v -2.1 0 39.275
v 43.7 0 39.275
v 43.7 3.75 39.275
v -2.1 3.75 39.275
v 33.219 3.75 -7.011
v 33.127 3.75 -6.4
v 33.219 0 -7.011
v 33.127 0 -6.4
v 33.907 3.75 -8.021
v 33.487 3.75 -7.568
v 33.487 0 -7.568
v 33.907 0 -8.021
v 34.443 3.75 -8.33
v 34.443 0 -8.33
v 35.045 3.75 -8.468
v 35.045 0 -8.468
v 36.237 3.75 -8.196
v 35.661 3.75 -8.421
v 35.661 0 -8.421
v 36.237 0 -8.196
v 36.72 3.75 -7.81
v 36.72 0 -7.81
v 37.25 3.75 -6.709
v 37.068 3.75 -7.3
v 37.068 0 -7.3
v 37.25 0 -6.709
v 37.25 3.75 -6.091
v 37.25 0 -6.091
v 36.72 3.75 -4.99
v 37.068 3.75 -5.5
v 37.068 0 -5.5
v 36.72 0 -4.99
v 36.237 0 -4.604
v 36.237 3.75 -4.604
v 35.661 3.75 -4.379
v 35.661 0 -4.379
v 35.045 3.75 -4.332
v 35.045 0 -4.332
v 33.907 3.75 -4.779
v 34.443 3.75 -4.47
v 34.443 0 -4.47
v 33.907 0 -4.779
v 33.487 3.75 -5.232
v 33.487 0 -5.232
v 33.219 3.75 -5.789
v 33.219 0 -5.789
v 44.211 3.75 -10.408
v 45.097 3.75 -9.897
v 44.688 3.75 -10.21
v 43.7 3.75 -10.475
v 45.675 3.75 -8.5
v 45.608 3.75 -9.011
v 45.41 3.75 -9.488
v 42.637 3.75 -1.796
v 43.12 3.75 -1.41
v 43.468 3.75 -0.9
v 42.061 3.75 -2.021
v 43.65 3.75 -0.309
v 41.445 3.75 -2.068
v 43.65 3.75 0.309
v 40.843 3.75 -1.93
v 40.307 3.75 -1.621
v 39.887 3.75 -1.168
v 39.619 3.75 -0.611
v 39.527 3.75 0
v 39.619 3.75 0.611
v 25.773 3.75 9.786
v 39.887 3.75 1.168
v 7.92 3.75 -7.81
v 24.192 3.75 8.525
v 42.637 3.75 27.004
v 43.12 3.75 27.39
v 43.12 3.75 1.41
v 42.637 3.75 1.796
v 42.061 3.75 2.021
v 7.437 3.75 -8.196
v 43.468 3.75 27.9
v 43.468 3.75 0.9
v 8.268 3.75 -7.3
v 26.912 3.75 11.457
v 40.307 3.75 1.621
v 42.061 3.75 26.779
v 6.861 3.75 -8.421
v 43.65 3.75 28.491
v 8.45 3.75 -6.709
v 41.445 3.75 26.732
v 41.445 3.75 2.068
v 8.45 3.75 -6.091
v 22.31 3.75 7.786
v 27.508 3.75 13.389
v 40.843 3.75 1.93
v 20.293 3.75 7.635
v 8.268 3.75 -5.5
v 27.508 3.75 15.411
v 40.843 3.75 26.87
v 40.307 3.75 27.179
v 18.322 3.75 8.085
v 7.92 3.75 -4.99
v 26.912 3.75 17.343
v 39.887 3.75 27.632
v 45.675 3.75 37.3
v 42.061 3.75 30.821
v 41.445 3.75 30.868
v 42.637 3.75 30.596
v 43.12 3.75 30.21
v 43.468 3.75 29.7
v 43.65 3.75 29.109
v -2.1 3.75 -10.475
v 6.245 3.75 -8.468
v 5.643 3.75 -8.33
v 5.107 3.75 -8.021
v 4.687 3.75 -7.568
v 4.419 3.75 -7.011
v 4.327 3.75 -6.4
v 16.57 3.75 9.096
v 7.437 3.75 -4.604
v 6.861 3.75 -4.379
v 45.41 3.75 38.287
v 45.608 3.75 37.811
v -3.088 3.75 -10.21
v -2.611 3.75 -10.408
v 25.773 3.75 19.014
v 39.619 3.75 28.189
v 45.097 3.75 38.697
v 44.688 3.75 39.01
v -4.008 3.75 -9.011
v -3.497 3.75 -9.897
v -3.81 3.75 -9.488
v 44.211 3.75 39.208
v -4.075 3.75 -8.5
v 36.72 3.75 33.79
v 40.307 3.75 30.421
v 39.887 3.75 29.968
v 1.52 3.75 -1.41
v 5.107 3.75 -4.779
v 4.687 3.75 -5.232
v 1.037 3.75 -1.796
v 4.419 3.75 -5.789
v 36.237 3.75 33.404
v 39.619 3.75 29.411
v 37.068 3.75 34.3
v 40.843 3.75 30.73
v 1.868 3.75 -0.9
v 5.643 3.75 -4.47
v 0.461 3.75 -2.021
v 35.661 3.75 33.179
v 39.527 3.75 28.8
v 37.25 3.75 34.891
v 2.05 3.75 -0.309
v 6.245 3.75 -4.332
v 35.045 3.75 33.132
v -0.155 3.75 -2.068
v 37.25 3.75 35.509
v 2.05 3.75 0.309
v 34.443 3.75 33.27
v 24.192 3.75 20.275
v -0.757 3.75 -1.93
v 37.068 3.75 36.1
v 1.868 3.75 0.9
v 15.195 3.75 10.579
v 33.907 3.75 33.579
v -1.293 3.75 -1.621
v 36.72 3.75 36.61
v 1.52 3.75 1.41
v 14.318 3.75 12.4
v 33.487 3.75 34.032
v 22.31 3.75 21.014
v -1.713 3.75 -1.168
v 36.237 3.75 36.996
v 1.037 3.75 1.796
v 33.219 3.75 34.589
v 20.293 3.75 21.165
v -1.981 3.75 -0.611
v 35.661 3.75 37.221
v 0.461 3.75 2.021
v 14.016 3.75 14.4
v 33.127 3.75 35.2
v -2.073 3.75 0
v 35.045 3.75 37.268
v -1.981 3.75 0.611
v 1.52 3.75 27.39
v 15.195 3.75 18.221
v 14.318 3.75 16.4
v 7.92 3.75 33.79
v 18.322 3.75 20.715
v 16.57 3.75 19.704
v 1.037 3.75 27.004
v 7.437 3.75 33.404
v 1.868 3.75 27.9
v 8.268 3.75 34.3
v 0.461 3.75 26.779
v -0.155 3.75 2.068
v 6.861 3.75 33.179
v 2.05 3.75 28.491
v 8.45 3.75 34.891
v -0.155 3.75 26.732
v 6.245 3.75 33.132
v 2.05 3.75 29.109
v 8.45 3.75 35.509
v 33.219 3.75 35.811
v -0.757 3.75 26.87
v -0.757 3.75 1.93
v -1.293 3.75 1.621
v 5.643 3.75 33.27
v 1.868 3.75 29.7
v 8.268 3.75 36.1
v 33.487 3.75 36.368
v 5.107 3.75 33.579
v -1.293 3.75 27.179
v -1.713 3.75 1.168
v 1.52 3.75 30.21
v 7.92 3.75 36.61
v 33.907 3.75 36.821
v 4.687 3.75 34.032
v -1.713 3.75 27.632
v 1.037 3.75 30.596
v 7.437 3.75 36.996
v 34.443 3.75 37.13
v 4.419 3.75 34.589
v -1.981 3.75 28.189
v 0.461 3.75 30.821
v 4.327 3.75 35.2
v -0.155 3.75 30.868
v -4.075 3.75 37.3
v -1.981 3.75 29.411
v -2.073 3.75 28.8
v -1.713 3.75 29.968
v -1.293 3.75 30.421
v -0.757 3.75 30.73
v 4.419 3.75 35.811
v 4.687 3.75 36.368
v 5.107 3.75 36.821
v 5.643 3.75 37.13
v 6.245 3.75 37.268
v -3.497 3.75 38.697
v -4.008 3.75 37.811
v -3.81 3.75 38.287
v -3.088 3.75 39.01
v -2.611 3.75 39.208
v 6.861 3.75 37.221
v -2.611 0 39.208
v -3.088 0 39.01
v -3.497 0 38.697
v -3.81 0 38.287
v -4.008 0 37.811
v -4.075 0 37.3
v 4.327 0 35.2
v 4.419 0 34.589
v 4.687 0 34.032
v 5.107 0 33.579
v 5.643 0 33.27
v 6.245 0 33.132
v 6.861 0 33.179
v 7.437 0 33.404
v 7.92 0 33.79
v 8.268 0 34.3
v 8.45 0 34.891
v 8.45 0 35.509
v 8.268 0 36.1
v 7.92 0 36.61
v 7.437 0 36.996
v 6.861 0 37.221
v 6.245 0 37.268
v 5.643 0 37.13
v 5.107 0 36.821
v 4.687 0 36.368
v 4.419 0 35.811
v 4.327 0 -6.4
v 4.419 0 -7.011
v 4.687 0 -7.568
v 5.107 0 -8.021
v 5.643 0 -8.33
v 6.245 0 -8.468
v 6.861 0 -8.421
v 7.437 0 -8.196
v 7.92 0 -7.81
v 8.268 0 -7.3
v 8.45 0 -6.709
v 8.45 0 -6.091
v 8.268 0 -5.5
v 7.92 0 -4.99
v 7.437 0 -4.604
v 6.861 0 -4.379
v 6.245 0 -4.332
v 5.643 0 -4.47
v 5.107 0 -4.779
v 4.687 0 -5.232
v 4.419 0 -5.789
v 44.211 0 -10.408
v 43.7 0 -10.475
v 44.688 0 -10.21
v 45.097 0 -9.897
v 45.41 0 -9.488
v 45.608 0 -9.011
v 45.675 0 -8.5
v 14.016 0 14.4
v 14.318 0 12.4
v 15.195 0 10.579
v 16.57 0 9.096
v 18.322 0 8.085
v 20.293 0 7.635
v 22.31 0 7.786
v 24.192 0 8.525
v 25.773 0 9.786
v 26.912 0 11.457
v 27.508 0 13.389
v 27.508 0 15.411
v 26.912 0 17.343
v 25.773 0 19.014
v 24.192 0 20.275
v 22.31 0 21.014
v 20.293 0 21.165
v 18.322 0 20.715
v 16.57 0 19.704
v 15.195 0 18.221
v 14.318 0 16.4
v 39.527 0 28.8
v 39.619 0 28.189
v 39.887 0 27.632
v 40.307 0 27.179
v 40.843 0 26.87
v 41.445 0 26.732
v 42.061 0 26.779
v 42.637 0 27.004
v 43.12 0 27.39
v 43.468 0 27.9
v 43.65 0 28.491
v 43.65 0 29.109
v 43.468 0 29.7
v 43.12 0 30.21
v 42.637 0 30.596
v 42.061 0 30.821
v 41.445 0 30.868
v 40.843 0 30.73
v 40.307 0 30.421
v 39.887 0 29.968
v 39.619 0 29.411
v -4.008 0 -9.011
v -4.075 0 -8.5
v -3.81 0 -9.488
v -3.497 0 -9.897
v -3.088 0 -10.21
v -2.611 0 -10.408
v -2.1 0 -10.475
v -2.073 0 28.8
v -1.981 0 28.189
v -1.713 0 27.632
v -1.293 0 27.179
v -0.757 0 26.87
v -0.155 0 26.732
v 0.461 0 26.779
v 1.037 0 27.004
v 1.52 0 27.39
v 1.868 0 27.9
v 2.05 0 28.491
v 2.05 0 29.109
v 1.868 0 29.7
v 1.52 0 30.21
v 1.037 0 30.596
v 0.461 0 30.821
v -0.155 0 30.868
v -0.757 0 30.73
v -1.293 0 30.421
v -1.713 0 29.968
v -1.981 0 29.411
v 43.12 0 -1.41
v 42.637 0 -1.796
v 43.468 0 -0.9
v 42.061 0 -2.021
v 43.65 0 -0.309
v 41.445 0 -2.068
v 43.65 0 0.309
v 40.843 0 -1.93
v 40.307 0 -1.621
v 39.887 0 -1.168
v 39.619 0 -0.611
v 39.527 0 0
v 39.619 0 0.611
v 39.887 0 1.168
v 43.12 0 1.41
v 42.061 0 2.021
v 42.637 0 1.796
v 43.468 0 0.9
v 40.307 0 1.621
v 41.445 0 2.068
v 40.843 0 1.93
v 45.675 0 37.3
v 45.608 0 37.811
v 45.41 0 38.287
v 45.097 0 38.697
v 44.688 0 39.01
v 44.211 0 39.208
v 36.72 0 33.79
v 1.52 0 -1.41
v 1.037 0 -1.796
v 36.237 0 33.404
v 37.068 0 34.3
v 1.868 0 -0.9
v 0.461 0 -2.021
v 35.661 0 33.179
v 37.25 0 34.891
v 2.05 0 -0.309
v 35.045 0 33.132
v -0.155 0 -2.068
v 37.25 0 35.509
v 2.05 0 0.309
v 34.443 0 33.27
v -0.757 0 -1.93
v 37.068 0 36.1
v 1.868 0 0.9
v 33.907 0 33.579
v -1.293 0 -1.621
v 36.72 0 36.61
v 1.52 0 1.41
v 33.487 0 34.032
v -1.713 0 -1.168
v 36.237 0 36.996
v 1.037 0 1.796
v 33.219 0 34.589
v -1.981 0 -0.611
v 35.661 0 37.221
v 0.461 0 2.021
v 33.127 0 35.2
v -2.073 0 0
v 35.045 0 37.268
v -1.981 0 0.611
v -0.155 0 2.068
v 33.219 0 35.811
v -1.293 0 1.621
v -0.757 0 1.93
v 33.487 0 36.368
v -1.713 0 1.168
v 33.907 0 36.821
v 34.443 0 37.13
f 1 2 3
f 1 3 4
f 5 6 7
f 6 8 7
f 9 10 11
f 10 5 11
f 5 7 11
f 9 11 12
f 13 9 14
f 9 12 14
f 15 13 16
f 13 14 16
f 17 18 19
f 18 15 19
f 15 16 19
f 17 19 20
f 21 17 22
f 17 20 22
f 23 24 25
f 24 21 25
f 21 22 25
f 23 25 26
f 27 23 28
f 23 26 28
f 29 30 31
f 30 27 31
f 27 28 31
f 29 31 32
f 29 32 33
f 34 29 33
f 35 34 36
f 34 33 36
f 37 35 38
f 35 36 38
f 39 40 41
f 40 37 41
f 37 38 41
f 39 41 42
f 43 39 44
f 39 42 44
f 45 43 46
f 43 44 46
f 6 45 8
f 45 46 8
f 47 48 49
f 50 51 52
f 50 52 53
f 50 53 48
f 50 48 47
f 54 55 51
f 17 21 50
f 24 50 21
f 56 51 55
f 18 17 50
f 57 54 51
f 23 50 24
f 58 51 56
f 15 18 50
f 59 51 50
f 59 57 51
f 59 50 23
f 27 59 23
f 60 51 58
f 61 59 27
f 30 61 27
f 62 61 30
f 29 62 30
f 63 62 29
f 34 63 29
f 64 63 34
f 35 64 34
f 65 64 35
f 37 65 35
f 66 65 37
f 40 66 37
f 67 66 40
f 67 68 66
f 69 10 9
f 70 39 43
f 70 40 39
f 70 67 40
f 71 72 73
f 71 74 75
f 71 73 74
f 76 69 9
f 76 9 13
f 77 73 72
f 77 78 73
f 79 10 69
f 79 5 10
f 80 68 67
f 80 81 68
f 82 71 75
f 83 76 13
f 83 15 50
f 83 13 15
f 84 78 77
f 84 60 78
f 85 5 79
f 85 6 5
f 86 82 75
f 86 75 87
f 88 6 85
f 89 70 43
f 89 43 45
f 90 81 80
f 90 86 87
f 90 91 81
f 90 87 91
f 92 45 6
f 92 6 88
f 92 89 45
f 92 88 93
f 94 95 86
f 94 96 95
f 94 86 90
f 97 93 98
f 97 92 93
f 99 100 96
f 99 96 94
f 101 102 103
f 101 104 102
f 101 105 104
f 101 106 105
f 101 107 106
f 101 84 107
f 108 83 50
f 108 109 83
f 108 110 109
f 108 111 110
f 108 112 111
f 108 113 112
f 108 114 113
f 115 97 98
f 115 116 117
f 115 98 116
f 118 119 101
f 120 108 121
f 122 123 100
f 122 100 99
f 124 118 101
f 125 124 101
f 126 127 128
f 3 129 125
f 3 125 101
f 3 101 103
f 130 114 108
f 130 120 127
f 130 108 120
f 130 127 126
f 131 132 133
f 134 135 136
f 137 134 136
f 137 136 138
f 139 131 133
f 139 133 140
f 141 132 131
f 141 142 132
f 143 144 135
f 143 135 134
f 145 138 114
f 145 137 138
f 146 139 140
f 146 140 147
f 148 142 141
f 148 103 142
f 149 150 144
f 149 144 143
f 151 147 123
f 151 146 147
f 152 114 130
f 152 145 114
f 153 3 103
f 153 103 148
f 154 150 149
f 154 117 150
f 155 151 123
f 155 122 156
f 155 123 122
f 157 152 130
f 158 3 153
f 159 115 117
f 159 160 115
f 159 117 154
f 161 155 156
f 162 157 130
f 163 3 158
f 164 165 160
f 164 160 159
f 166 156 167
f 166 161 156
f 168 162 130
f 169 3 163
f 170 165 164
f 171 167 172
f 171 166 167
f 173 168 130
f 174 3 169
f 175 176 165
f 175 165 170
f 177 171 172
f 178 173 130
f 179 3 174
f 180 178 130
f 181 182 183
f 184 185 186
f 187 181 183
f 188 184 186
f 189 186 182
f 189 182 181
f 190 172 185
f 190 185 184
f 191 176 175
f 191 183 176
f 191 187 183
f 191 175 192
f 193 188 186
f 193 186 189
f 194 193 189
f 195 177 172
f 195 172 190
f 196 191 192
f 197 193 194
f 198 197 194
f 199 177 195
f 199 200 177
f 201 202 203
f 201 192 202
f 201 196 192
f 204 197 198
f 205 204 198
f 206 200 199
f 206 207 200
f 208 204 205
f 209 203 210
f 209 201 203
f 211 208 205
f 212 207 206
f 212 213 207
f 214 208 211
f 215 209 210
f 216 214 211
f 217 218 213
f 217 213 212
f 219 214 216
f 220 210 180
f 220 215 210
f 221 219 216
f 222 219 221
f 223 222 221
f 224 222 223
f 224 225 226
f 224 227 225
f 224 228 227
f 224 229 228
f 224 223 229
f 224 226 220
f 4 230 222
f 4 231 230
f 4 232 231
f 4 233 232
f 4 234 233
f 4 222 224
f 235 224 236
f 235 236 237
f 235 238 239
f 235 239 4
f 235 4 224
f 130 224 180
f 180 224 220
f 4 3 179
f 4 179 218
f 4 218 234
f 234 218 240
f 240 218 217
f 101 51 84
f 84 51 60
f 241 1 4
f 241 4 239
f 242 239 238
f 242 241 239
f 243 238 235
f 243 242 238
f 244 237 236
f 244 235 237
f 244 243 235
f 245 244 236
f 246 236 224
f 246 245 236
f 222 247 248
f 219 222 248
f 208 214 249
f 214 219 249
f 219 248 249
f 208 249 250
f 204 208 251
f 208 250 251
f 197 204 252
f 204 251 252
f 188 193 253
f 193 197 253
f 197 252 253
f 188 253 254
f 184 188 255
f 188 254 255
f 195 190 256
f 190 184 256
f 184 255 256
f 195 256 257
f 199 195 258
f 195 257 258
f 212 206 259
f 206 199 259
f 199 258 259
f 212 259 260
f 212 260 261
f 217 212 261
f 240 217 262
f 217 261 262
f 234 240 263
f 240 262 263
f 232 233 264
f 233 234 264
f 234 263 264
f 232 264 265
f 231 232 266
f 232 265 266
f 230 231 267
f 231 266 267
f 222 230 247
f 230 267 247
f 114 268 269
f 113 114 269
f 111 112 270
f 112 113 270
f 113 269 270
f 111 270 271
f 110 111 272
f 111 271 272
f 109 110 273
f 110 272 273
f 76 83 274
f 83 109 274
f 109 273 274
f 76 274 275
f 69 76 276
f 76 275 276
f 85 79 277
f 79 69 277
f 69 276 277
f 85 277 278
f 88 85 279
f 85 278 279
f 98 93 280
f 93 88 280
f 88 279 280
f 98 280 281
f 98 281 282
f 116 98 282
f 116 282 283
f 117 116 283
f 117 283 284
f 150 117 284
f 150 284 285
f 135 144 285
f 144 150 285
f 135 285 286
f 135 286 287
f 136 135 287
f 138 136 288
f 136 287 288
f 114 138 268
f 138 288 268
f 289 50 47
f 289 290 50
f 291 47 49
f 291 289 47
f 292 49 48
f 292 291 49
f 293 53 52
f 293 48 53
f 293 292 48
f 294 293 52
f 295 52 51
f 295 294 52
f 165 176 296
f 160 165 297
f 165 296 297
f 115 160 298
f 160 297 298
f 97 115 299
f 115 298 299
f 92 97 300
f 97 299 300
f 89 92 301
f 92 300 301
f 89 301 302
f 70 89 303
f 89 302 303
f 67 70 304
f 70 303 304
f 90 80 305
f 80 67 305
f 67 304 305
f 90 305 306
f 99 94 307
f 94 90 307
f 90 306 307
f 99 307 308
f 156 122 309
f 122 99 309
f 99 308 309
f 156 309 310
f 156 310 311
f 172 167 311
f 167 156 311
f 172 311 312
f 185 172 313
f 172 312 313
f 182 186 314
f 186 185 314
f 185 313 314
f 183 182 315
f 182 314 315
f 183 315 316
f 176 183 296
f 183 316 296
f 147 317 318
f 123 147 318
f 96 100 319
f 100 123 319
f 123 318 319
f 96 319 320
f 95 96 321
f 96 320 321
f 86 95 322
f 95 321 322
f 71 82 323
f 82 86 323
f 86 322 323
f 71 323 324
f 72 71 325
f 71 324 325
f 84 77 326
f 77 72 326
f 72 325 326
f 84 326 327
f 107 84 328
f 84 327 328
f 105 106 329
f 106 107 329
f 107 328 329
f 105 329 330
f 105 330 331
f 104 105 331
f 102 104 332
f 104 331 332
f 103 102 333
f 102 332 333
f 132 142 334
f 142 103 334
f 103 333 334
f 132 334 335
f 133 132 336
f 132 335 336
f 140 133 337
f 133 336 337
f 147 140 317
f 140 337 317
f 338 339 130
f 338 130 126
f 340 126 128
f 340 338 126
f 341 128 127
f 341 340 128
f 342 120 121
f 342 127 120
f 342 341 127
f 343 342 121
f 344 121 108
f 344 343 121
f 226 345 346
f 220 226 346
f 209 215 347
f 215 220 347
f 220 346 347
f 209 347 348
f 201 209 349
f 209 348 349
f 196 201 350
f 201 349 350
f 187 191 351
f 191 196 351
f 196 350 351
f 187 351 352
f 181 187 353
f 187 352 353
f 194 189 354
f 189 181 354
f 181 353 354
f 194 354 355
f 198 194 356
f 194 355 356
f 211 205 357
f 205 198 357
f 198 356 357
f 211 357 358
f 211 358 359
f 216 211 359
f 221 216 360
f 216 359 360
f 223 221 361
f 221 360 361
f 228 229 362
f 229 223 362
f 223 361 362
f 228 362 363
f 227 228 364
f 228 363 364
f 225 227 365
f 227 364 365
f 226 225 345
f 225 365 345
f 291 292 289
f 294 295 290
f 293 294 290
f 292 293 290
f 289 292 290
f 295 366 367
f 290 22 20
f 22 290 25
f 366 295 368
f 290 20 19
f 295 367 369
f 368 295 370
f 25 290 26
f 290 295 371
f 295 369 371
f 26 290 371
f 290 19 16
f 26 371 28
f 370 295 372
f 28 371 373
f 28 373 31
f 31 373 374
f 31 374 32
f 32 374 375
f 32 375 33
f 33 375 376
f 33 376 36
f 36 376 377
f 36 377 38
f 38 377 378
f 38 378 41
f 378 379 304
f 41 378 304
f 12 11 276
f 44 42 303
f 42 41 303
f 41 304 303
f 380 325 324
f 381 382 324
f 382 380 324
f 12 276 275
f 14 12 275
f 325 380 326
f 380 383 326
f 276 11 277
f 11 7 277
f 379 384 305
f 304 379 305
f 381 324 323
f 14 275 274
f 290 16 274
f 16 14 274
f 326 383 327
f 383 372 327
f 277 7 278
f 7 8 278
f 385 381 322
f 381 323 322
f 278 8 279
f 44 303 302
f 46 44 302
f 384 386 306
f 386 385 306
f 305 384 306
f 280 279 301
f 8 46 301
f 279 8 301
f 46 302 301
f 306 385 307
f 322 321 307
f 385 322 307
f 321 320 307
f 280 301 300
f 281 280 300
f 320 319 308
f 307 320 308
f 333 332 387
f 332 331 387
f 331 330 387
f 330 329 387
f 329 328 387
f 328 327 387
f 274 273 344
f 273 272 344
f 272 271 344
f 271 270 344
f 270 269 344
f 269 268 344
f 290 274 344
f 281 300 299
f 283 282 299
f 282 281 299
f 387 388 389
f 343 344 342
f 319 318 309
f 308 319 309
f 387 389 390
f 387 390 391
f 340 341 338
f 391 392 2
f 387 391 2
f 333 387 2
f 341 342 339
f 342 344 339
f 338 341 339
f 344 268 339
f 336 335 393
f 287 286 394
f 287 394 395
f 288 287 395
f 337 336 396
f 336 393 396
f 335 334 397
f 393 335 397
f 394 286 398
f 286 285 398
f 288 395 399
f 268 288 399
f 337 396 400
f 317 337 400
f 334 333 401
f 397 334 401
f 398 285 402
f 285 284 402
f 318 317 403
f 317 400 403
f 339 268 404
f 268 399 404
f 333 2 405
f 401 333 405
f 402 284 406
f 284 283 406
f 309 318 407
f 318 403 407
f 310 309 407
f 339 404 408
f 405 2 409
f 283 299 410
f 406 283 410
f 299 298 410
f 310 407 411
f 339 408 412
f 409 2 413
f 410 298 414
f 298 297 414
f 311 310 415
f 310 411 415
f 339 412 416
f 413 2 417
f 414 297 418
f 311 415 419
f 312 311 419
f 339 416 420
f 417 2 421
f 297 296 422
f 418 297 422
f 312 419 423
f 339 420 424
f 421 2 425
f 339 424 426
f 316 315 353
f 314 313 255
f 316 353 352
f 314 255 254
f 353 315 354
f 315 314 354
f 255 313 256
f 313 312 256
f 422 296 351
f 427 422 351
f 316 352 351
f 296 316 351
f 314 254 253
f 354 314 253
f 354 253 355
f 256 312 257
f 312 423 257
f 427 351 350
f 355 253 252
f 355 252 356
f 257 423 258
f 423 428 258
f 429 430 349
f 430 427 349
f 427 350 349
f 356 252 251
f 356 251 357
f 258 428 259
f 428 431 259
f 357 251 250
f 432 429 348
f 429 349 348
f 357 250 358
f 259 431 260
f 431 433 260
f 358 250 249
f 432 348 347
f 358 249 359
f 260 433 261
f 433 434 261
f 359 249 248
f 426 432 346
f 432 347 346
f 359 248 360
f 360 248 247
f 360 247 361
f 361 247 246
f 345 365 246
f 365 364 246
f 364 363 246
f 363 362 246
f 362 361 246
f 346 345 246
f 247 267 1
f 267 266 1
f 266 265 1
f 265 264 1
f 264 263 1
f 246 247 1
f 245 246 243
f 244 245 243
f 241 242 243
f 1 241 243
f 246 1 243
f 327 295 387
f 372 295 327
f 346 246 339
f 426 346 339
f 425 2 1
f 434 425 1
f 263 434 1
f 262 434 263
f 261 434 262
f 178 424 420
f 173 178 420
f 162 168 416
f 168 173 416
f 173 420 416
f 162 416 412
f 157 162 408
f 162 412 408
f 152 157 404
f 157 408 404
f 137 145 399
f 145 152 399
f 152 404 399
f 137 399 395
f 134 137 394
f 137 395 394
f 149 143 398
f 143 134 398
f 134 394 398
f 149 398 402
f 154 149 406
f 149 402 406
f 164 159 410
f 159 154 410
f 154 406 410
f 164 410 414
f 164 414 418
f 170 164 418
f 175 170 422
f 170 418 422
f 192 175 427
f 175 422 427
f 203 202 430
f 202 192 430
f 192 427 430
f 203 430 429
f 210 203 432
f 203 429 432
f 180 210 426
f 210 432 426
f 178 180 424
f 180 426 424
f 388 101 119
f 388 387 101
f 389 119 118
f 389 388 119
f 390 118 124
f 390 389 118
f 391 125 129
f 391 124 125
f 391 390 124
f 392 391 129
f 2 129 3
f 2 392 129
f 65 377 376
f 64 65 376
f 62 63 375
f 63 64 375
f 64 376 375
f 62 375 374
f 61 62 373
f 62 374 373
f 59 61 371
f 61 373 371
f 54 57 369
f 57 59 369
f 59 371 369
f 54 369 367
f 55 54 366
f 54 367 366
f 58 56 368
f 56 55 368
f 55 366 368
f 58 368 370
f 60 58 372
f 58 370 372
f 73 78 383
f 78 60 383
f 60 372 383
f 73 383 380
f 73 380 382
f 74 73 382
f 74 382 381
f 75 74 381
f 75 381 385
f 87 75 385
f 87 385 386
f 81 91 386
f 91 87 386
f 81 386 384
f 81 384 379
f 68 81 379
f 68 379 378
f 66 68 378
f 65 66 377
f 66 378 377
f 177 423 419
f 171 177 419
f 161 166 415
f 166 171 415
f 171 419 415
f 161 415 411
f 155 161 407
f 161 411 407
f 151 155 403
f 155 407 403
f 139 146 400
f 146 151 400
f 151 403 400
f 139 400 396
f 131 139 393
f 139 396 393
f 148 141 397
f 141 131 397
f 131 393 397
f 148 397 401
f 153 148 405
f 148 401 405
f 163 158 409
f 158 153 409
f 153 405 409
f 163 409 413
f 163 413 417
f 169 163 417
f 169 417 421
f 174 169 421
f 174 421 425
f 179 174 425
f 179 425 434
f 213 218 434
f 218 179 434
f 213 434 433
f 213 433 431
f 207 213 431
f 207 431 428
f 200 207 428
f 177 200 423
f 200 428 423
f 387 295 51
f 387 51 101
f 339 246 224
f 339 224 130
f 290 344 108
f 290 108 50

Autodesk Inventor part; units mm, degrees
ref_plane "YZ Plane" through (0, 0, 0) normal (1, 0, 0) x (0, 1, 0)
ref_plane "XZ Plane" through (0, 0, 0) normal (0, 1, 0) x (-1, 0, 0)
ref_plane "XY Plane" through (0, 0, 0) normal (0, 0, 1) x (1, 0, 0)
sketch "Sketch1" plane through (0, 0, 0) normal (0, 1, 0) x (-1, 0, 0)
  circle A0 centre (-20.8, 14.4) radius 6.7838
  circle A1 centre (-42.7, -7.5) radius 1.875 projected
  circle A2 centre (1.1, 36.3) radius 1.875 projected
  circle A3 centre (1.1, -7.5) radius 1.875 projected
  circle A4 centre (-42.7, 36.3) radius 1.875 projected
  circle A5 centre (-6.4, 35.2) radius 2.0734 projected
  circle A6 centre (-35.2, -6.4) radius 2.0734 projected
  circle A7 centre (-6.4, -6.4) radius 2.0734 projected
  circle A8 centre (0, 0) radius 2.0734 projected
  line L0 (-37.85, 31.45) -> (-37.85, -2.65) projected
  line L1 (-3.75, 31.45) -> (-37.85, 31.45) projected
  line L2 (-3.75, -2.65) -> (-3.75, 31.45) projected
  line L3 (-37.85, -2.65) -> (-3.75, -2.65) projected
  circle A9 centre (0, 28.8) radius 2.0734 projected
  circle A10 centre (-35.2, 35.2) radius 2.0734 projected
  circle A11 centre (-41.6, 0) radius 2.0734 projected
  circle A12 centre (-41.6, 28.8) radius 2.0734 projected
  line L4 (-43.7, 39.275) -> (2.1, 39.275) projected
  arc A13 (-43.7, 39.275) -> (-45.675, 37.3) centre (-43.7, 37.3) ccw projected
  line L5 (-45.675, -8.5) -> (-45.675, 37.3) projected
  arc A14 (-45.675, -8.5) -> (-43.7, -10.475) centre (-43.7, -8.5) ccw projected
  line L6 (2.1, -10.475) -> (-43.7, -10.475) projected
  arc A15 (2.1, -10.475) -> (4.075, -8.5) centre (2.1, -8.5) ccw projected
  line L7 (4.075, 37.3) -> (4.075, -8.5) projected
  arc A16 (4.075, 37.3) -> (2.1, 39.275) centre (2.1, 37.3) ccw projected
  line L8 (-3.75, 14.4) -> (-37.85, 14.4)
  dimension "d36" = 13.5675
extrude "Extrusion1" add sketch "Sketch1" along normal blind 3.75 contours L8 L2 L3 L0 A0 | A0 L8 L0 L1 L2 | A1 | A2 | A3 | A4 | L4 A16 L7 A15 L6 A14 L5 A13
properties part number "Top Mount (SM05)"
